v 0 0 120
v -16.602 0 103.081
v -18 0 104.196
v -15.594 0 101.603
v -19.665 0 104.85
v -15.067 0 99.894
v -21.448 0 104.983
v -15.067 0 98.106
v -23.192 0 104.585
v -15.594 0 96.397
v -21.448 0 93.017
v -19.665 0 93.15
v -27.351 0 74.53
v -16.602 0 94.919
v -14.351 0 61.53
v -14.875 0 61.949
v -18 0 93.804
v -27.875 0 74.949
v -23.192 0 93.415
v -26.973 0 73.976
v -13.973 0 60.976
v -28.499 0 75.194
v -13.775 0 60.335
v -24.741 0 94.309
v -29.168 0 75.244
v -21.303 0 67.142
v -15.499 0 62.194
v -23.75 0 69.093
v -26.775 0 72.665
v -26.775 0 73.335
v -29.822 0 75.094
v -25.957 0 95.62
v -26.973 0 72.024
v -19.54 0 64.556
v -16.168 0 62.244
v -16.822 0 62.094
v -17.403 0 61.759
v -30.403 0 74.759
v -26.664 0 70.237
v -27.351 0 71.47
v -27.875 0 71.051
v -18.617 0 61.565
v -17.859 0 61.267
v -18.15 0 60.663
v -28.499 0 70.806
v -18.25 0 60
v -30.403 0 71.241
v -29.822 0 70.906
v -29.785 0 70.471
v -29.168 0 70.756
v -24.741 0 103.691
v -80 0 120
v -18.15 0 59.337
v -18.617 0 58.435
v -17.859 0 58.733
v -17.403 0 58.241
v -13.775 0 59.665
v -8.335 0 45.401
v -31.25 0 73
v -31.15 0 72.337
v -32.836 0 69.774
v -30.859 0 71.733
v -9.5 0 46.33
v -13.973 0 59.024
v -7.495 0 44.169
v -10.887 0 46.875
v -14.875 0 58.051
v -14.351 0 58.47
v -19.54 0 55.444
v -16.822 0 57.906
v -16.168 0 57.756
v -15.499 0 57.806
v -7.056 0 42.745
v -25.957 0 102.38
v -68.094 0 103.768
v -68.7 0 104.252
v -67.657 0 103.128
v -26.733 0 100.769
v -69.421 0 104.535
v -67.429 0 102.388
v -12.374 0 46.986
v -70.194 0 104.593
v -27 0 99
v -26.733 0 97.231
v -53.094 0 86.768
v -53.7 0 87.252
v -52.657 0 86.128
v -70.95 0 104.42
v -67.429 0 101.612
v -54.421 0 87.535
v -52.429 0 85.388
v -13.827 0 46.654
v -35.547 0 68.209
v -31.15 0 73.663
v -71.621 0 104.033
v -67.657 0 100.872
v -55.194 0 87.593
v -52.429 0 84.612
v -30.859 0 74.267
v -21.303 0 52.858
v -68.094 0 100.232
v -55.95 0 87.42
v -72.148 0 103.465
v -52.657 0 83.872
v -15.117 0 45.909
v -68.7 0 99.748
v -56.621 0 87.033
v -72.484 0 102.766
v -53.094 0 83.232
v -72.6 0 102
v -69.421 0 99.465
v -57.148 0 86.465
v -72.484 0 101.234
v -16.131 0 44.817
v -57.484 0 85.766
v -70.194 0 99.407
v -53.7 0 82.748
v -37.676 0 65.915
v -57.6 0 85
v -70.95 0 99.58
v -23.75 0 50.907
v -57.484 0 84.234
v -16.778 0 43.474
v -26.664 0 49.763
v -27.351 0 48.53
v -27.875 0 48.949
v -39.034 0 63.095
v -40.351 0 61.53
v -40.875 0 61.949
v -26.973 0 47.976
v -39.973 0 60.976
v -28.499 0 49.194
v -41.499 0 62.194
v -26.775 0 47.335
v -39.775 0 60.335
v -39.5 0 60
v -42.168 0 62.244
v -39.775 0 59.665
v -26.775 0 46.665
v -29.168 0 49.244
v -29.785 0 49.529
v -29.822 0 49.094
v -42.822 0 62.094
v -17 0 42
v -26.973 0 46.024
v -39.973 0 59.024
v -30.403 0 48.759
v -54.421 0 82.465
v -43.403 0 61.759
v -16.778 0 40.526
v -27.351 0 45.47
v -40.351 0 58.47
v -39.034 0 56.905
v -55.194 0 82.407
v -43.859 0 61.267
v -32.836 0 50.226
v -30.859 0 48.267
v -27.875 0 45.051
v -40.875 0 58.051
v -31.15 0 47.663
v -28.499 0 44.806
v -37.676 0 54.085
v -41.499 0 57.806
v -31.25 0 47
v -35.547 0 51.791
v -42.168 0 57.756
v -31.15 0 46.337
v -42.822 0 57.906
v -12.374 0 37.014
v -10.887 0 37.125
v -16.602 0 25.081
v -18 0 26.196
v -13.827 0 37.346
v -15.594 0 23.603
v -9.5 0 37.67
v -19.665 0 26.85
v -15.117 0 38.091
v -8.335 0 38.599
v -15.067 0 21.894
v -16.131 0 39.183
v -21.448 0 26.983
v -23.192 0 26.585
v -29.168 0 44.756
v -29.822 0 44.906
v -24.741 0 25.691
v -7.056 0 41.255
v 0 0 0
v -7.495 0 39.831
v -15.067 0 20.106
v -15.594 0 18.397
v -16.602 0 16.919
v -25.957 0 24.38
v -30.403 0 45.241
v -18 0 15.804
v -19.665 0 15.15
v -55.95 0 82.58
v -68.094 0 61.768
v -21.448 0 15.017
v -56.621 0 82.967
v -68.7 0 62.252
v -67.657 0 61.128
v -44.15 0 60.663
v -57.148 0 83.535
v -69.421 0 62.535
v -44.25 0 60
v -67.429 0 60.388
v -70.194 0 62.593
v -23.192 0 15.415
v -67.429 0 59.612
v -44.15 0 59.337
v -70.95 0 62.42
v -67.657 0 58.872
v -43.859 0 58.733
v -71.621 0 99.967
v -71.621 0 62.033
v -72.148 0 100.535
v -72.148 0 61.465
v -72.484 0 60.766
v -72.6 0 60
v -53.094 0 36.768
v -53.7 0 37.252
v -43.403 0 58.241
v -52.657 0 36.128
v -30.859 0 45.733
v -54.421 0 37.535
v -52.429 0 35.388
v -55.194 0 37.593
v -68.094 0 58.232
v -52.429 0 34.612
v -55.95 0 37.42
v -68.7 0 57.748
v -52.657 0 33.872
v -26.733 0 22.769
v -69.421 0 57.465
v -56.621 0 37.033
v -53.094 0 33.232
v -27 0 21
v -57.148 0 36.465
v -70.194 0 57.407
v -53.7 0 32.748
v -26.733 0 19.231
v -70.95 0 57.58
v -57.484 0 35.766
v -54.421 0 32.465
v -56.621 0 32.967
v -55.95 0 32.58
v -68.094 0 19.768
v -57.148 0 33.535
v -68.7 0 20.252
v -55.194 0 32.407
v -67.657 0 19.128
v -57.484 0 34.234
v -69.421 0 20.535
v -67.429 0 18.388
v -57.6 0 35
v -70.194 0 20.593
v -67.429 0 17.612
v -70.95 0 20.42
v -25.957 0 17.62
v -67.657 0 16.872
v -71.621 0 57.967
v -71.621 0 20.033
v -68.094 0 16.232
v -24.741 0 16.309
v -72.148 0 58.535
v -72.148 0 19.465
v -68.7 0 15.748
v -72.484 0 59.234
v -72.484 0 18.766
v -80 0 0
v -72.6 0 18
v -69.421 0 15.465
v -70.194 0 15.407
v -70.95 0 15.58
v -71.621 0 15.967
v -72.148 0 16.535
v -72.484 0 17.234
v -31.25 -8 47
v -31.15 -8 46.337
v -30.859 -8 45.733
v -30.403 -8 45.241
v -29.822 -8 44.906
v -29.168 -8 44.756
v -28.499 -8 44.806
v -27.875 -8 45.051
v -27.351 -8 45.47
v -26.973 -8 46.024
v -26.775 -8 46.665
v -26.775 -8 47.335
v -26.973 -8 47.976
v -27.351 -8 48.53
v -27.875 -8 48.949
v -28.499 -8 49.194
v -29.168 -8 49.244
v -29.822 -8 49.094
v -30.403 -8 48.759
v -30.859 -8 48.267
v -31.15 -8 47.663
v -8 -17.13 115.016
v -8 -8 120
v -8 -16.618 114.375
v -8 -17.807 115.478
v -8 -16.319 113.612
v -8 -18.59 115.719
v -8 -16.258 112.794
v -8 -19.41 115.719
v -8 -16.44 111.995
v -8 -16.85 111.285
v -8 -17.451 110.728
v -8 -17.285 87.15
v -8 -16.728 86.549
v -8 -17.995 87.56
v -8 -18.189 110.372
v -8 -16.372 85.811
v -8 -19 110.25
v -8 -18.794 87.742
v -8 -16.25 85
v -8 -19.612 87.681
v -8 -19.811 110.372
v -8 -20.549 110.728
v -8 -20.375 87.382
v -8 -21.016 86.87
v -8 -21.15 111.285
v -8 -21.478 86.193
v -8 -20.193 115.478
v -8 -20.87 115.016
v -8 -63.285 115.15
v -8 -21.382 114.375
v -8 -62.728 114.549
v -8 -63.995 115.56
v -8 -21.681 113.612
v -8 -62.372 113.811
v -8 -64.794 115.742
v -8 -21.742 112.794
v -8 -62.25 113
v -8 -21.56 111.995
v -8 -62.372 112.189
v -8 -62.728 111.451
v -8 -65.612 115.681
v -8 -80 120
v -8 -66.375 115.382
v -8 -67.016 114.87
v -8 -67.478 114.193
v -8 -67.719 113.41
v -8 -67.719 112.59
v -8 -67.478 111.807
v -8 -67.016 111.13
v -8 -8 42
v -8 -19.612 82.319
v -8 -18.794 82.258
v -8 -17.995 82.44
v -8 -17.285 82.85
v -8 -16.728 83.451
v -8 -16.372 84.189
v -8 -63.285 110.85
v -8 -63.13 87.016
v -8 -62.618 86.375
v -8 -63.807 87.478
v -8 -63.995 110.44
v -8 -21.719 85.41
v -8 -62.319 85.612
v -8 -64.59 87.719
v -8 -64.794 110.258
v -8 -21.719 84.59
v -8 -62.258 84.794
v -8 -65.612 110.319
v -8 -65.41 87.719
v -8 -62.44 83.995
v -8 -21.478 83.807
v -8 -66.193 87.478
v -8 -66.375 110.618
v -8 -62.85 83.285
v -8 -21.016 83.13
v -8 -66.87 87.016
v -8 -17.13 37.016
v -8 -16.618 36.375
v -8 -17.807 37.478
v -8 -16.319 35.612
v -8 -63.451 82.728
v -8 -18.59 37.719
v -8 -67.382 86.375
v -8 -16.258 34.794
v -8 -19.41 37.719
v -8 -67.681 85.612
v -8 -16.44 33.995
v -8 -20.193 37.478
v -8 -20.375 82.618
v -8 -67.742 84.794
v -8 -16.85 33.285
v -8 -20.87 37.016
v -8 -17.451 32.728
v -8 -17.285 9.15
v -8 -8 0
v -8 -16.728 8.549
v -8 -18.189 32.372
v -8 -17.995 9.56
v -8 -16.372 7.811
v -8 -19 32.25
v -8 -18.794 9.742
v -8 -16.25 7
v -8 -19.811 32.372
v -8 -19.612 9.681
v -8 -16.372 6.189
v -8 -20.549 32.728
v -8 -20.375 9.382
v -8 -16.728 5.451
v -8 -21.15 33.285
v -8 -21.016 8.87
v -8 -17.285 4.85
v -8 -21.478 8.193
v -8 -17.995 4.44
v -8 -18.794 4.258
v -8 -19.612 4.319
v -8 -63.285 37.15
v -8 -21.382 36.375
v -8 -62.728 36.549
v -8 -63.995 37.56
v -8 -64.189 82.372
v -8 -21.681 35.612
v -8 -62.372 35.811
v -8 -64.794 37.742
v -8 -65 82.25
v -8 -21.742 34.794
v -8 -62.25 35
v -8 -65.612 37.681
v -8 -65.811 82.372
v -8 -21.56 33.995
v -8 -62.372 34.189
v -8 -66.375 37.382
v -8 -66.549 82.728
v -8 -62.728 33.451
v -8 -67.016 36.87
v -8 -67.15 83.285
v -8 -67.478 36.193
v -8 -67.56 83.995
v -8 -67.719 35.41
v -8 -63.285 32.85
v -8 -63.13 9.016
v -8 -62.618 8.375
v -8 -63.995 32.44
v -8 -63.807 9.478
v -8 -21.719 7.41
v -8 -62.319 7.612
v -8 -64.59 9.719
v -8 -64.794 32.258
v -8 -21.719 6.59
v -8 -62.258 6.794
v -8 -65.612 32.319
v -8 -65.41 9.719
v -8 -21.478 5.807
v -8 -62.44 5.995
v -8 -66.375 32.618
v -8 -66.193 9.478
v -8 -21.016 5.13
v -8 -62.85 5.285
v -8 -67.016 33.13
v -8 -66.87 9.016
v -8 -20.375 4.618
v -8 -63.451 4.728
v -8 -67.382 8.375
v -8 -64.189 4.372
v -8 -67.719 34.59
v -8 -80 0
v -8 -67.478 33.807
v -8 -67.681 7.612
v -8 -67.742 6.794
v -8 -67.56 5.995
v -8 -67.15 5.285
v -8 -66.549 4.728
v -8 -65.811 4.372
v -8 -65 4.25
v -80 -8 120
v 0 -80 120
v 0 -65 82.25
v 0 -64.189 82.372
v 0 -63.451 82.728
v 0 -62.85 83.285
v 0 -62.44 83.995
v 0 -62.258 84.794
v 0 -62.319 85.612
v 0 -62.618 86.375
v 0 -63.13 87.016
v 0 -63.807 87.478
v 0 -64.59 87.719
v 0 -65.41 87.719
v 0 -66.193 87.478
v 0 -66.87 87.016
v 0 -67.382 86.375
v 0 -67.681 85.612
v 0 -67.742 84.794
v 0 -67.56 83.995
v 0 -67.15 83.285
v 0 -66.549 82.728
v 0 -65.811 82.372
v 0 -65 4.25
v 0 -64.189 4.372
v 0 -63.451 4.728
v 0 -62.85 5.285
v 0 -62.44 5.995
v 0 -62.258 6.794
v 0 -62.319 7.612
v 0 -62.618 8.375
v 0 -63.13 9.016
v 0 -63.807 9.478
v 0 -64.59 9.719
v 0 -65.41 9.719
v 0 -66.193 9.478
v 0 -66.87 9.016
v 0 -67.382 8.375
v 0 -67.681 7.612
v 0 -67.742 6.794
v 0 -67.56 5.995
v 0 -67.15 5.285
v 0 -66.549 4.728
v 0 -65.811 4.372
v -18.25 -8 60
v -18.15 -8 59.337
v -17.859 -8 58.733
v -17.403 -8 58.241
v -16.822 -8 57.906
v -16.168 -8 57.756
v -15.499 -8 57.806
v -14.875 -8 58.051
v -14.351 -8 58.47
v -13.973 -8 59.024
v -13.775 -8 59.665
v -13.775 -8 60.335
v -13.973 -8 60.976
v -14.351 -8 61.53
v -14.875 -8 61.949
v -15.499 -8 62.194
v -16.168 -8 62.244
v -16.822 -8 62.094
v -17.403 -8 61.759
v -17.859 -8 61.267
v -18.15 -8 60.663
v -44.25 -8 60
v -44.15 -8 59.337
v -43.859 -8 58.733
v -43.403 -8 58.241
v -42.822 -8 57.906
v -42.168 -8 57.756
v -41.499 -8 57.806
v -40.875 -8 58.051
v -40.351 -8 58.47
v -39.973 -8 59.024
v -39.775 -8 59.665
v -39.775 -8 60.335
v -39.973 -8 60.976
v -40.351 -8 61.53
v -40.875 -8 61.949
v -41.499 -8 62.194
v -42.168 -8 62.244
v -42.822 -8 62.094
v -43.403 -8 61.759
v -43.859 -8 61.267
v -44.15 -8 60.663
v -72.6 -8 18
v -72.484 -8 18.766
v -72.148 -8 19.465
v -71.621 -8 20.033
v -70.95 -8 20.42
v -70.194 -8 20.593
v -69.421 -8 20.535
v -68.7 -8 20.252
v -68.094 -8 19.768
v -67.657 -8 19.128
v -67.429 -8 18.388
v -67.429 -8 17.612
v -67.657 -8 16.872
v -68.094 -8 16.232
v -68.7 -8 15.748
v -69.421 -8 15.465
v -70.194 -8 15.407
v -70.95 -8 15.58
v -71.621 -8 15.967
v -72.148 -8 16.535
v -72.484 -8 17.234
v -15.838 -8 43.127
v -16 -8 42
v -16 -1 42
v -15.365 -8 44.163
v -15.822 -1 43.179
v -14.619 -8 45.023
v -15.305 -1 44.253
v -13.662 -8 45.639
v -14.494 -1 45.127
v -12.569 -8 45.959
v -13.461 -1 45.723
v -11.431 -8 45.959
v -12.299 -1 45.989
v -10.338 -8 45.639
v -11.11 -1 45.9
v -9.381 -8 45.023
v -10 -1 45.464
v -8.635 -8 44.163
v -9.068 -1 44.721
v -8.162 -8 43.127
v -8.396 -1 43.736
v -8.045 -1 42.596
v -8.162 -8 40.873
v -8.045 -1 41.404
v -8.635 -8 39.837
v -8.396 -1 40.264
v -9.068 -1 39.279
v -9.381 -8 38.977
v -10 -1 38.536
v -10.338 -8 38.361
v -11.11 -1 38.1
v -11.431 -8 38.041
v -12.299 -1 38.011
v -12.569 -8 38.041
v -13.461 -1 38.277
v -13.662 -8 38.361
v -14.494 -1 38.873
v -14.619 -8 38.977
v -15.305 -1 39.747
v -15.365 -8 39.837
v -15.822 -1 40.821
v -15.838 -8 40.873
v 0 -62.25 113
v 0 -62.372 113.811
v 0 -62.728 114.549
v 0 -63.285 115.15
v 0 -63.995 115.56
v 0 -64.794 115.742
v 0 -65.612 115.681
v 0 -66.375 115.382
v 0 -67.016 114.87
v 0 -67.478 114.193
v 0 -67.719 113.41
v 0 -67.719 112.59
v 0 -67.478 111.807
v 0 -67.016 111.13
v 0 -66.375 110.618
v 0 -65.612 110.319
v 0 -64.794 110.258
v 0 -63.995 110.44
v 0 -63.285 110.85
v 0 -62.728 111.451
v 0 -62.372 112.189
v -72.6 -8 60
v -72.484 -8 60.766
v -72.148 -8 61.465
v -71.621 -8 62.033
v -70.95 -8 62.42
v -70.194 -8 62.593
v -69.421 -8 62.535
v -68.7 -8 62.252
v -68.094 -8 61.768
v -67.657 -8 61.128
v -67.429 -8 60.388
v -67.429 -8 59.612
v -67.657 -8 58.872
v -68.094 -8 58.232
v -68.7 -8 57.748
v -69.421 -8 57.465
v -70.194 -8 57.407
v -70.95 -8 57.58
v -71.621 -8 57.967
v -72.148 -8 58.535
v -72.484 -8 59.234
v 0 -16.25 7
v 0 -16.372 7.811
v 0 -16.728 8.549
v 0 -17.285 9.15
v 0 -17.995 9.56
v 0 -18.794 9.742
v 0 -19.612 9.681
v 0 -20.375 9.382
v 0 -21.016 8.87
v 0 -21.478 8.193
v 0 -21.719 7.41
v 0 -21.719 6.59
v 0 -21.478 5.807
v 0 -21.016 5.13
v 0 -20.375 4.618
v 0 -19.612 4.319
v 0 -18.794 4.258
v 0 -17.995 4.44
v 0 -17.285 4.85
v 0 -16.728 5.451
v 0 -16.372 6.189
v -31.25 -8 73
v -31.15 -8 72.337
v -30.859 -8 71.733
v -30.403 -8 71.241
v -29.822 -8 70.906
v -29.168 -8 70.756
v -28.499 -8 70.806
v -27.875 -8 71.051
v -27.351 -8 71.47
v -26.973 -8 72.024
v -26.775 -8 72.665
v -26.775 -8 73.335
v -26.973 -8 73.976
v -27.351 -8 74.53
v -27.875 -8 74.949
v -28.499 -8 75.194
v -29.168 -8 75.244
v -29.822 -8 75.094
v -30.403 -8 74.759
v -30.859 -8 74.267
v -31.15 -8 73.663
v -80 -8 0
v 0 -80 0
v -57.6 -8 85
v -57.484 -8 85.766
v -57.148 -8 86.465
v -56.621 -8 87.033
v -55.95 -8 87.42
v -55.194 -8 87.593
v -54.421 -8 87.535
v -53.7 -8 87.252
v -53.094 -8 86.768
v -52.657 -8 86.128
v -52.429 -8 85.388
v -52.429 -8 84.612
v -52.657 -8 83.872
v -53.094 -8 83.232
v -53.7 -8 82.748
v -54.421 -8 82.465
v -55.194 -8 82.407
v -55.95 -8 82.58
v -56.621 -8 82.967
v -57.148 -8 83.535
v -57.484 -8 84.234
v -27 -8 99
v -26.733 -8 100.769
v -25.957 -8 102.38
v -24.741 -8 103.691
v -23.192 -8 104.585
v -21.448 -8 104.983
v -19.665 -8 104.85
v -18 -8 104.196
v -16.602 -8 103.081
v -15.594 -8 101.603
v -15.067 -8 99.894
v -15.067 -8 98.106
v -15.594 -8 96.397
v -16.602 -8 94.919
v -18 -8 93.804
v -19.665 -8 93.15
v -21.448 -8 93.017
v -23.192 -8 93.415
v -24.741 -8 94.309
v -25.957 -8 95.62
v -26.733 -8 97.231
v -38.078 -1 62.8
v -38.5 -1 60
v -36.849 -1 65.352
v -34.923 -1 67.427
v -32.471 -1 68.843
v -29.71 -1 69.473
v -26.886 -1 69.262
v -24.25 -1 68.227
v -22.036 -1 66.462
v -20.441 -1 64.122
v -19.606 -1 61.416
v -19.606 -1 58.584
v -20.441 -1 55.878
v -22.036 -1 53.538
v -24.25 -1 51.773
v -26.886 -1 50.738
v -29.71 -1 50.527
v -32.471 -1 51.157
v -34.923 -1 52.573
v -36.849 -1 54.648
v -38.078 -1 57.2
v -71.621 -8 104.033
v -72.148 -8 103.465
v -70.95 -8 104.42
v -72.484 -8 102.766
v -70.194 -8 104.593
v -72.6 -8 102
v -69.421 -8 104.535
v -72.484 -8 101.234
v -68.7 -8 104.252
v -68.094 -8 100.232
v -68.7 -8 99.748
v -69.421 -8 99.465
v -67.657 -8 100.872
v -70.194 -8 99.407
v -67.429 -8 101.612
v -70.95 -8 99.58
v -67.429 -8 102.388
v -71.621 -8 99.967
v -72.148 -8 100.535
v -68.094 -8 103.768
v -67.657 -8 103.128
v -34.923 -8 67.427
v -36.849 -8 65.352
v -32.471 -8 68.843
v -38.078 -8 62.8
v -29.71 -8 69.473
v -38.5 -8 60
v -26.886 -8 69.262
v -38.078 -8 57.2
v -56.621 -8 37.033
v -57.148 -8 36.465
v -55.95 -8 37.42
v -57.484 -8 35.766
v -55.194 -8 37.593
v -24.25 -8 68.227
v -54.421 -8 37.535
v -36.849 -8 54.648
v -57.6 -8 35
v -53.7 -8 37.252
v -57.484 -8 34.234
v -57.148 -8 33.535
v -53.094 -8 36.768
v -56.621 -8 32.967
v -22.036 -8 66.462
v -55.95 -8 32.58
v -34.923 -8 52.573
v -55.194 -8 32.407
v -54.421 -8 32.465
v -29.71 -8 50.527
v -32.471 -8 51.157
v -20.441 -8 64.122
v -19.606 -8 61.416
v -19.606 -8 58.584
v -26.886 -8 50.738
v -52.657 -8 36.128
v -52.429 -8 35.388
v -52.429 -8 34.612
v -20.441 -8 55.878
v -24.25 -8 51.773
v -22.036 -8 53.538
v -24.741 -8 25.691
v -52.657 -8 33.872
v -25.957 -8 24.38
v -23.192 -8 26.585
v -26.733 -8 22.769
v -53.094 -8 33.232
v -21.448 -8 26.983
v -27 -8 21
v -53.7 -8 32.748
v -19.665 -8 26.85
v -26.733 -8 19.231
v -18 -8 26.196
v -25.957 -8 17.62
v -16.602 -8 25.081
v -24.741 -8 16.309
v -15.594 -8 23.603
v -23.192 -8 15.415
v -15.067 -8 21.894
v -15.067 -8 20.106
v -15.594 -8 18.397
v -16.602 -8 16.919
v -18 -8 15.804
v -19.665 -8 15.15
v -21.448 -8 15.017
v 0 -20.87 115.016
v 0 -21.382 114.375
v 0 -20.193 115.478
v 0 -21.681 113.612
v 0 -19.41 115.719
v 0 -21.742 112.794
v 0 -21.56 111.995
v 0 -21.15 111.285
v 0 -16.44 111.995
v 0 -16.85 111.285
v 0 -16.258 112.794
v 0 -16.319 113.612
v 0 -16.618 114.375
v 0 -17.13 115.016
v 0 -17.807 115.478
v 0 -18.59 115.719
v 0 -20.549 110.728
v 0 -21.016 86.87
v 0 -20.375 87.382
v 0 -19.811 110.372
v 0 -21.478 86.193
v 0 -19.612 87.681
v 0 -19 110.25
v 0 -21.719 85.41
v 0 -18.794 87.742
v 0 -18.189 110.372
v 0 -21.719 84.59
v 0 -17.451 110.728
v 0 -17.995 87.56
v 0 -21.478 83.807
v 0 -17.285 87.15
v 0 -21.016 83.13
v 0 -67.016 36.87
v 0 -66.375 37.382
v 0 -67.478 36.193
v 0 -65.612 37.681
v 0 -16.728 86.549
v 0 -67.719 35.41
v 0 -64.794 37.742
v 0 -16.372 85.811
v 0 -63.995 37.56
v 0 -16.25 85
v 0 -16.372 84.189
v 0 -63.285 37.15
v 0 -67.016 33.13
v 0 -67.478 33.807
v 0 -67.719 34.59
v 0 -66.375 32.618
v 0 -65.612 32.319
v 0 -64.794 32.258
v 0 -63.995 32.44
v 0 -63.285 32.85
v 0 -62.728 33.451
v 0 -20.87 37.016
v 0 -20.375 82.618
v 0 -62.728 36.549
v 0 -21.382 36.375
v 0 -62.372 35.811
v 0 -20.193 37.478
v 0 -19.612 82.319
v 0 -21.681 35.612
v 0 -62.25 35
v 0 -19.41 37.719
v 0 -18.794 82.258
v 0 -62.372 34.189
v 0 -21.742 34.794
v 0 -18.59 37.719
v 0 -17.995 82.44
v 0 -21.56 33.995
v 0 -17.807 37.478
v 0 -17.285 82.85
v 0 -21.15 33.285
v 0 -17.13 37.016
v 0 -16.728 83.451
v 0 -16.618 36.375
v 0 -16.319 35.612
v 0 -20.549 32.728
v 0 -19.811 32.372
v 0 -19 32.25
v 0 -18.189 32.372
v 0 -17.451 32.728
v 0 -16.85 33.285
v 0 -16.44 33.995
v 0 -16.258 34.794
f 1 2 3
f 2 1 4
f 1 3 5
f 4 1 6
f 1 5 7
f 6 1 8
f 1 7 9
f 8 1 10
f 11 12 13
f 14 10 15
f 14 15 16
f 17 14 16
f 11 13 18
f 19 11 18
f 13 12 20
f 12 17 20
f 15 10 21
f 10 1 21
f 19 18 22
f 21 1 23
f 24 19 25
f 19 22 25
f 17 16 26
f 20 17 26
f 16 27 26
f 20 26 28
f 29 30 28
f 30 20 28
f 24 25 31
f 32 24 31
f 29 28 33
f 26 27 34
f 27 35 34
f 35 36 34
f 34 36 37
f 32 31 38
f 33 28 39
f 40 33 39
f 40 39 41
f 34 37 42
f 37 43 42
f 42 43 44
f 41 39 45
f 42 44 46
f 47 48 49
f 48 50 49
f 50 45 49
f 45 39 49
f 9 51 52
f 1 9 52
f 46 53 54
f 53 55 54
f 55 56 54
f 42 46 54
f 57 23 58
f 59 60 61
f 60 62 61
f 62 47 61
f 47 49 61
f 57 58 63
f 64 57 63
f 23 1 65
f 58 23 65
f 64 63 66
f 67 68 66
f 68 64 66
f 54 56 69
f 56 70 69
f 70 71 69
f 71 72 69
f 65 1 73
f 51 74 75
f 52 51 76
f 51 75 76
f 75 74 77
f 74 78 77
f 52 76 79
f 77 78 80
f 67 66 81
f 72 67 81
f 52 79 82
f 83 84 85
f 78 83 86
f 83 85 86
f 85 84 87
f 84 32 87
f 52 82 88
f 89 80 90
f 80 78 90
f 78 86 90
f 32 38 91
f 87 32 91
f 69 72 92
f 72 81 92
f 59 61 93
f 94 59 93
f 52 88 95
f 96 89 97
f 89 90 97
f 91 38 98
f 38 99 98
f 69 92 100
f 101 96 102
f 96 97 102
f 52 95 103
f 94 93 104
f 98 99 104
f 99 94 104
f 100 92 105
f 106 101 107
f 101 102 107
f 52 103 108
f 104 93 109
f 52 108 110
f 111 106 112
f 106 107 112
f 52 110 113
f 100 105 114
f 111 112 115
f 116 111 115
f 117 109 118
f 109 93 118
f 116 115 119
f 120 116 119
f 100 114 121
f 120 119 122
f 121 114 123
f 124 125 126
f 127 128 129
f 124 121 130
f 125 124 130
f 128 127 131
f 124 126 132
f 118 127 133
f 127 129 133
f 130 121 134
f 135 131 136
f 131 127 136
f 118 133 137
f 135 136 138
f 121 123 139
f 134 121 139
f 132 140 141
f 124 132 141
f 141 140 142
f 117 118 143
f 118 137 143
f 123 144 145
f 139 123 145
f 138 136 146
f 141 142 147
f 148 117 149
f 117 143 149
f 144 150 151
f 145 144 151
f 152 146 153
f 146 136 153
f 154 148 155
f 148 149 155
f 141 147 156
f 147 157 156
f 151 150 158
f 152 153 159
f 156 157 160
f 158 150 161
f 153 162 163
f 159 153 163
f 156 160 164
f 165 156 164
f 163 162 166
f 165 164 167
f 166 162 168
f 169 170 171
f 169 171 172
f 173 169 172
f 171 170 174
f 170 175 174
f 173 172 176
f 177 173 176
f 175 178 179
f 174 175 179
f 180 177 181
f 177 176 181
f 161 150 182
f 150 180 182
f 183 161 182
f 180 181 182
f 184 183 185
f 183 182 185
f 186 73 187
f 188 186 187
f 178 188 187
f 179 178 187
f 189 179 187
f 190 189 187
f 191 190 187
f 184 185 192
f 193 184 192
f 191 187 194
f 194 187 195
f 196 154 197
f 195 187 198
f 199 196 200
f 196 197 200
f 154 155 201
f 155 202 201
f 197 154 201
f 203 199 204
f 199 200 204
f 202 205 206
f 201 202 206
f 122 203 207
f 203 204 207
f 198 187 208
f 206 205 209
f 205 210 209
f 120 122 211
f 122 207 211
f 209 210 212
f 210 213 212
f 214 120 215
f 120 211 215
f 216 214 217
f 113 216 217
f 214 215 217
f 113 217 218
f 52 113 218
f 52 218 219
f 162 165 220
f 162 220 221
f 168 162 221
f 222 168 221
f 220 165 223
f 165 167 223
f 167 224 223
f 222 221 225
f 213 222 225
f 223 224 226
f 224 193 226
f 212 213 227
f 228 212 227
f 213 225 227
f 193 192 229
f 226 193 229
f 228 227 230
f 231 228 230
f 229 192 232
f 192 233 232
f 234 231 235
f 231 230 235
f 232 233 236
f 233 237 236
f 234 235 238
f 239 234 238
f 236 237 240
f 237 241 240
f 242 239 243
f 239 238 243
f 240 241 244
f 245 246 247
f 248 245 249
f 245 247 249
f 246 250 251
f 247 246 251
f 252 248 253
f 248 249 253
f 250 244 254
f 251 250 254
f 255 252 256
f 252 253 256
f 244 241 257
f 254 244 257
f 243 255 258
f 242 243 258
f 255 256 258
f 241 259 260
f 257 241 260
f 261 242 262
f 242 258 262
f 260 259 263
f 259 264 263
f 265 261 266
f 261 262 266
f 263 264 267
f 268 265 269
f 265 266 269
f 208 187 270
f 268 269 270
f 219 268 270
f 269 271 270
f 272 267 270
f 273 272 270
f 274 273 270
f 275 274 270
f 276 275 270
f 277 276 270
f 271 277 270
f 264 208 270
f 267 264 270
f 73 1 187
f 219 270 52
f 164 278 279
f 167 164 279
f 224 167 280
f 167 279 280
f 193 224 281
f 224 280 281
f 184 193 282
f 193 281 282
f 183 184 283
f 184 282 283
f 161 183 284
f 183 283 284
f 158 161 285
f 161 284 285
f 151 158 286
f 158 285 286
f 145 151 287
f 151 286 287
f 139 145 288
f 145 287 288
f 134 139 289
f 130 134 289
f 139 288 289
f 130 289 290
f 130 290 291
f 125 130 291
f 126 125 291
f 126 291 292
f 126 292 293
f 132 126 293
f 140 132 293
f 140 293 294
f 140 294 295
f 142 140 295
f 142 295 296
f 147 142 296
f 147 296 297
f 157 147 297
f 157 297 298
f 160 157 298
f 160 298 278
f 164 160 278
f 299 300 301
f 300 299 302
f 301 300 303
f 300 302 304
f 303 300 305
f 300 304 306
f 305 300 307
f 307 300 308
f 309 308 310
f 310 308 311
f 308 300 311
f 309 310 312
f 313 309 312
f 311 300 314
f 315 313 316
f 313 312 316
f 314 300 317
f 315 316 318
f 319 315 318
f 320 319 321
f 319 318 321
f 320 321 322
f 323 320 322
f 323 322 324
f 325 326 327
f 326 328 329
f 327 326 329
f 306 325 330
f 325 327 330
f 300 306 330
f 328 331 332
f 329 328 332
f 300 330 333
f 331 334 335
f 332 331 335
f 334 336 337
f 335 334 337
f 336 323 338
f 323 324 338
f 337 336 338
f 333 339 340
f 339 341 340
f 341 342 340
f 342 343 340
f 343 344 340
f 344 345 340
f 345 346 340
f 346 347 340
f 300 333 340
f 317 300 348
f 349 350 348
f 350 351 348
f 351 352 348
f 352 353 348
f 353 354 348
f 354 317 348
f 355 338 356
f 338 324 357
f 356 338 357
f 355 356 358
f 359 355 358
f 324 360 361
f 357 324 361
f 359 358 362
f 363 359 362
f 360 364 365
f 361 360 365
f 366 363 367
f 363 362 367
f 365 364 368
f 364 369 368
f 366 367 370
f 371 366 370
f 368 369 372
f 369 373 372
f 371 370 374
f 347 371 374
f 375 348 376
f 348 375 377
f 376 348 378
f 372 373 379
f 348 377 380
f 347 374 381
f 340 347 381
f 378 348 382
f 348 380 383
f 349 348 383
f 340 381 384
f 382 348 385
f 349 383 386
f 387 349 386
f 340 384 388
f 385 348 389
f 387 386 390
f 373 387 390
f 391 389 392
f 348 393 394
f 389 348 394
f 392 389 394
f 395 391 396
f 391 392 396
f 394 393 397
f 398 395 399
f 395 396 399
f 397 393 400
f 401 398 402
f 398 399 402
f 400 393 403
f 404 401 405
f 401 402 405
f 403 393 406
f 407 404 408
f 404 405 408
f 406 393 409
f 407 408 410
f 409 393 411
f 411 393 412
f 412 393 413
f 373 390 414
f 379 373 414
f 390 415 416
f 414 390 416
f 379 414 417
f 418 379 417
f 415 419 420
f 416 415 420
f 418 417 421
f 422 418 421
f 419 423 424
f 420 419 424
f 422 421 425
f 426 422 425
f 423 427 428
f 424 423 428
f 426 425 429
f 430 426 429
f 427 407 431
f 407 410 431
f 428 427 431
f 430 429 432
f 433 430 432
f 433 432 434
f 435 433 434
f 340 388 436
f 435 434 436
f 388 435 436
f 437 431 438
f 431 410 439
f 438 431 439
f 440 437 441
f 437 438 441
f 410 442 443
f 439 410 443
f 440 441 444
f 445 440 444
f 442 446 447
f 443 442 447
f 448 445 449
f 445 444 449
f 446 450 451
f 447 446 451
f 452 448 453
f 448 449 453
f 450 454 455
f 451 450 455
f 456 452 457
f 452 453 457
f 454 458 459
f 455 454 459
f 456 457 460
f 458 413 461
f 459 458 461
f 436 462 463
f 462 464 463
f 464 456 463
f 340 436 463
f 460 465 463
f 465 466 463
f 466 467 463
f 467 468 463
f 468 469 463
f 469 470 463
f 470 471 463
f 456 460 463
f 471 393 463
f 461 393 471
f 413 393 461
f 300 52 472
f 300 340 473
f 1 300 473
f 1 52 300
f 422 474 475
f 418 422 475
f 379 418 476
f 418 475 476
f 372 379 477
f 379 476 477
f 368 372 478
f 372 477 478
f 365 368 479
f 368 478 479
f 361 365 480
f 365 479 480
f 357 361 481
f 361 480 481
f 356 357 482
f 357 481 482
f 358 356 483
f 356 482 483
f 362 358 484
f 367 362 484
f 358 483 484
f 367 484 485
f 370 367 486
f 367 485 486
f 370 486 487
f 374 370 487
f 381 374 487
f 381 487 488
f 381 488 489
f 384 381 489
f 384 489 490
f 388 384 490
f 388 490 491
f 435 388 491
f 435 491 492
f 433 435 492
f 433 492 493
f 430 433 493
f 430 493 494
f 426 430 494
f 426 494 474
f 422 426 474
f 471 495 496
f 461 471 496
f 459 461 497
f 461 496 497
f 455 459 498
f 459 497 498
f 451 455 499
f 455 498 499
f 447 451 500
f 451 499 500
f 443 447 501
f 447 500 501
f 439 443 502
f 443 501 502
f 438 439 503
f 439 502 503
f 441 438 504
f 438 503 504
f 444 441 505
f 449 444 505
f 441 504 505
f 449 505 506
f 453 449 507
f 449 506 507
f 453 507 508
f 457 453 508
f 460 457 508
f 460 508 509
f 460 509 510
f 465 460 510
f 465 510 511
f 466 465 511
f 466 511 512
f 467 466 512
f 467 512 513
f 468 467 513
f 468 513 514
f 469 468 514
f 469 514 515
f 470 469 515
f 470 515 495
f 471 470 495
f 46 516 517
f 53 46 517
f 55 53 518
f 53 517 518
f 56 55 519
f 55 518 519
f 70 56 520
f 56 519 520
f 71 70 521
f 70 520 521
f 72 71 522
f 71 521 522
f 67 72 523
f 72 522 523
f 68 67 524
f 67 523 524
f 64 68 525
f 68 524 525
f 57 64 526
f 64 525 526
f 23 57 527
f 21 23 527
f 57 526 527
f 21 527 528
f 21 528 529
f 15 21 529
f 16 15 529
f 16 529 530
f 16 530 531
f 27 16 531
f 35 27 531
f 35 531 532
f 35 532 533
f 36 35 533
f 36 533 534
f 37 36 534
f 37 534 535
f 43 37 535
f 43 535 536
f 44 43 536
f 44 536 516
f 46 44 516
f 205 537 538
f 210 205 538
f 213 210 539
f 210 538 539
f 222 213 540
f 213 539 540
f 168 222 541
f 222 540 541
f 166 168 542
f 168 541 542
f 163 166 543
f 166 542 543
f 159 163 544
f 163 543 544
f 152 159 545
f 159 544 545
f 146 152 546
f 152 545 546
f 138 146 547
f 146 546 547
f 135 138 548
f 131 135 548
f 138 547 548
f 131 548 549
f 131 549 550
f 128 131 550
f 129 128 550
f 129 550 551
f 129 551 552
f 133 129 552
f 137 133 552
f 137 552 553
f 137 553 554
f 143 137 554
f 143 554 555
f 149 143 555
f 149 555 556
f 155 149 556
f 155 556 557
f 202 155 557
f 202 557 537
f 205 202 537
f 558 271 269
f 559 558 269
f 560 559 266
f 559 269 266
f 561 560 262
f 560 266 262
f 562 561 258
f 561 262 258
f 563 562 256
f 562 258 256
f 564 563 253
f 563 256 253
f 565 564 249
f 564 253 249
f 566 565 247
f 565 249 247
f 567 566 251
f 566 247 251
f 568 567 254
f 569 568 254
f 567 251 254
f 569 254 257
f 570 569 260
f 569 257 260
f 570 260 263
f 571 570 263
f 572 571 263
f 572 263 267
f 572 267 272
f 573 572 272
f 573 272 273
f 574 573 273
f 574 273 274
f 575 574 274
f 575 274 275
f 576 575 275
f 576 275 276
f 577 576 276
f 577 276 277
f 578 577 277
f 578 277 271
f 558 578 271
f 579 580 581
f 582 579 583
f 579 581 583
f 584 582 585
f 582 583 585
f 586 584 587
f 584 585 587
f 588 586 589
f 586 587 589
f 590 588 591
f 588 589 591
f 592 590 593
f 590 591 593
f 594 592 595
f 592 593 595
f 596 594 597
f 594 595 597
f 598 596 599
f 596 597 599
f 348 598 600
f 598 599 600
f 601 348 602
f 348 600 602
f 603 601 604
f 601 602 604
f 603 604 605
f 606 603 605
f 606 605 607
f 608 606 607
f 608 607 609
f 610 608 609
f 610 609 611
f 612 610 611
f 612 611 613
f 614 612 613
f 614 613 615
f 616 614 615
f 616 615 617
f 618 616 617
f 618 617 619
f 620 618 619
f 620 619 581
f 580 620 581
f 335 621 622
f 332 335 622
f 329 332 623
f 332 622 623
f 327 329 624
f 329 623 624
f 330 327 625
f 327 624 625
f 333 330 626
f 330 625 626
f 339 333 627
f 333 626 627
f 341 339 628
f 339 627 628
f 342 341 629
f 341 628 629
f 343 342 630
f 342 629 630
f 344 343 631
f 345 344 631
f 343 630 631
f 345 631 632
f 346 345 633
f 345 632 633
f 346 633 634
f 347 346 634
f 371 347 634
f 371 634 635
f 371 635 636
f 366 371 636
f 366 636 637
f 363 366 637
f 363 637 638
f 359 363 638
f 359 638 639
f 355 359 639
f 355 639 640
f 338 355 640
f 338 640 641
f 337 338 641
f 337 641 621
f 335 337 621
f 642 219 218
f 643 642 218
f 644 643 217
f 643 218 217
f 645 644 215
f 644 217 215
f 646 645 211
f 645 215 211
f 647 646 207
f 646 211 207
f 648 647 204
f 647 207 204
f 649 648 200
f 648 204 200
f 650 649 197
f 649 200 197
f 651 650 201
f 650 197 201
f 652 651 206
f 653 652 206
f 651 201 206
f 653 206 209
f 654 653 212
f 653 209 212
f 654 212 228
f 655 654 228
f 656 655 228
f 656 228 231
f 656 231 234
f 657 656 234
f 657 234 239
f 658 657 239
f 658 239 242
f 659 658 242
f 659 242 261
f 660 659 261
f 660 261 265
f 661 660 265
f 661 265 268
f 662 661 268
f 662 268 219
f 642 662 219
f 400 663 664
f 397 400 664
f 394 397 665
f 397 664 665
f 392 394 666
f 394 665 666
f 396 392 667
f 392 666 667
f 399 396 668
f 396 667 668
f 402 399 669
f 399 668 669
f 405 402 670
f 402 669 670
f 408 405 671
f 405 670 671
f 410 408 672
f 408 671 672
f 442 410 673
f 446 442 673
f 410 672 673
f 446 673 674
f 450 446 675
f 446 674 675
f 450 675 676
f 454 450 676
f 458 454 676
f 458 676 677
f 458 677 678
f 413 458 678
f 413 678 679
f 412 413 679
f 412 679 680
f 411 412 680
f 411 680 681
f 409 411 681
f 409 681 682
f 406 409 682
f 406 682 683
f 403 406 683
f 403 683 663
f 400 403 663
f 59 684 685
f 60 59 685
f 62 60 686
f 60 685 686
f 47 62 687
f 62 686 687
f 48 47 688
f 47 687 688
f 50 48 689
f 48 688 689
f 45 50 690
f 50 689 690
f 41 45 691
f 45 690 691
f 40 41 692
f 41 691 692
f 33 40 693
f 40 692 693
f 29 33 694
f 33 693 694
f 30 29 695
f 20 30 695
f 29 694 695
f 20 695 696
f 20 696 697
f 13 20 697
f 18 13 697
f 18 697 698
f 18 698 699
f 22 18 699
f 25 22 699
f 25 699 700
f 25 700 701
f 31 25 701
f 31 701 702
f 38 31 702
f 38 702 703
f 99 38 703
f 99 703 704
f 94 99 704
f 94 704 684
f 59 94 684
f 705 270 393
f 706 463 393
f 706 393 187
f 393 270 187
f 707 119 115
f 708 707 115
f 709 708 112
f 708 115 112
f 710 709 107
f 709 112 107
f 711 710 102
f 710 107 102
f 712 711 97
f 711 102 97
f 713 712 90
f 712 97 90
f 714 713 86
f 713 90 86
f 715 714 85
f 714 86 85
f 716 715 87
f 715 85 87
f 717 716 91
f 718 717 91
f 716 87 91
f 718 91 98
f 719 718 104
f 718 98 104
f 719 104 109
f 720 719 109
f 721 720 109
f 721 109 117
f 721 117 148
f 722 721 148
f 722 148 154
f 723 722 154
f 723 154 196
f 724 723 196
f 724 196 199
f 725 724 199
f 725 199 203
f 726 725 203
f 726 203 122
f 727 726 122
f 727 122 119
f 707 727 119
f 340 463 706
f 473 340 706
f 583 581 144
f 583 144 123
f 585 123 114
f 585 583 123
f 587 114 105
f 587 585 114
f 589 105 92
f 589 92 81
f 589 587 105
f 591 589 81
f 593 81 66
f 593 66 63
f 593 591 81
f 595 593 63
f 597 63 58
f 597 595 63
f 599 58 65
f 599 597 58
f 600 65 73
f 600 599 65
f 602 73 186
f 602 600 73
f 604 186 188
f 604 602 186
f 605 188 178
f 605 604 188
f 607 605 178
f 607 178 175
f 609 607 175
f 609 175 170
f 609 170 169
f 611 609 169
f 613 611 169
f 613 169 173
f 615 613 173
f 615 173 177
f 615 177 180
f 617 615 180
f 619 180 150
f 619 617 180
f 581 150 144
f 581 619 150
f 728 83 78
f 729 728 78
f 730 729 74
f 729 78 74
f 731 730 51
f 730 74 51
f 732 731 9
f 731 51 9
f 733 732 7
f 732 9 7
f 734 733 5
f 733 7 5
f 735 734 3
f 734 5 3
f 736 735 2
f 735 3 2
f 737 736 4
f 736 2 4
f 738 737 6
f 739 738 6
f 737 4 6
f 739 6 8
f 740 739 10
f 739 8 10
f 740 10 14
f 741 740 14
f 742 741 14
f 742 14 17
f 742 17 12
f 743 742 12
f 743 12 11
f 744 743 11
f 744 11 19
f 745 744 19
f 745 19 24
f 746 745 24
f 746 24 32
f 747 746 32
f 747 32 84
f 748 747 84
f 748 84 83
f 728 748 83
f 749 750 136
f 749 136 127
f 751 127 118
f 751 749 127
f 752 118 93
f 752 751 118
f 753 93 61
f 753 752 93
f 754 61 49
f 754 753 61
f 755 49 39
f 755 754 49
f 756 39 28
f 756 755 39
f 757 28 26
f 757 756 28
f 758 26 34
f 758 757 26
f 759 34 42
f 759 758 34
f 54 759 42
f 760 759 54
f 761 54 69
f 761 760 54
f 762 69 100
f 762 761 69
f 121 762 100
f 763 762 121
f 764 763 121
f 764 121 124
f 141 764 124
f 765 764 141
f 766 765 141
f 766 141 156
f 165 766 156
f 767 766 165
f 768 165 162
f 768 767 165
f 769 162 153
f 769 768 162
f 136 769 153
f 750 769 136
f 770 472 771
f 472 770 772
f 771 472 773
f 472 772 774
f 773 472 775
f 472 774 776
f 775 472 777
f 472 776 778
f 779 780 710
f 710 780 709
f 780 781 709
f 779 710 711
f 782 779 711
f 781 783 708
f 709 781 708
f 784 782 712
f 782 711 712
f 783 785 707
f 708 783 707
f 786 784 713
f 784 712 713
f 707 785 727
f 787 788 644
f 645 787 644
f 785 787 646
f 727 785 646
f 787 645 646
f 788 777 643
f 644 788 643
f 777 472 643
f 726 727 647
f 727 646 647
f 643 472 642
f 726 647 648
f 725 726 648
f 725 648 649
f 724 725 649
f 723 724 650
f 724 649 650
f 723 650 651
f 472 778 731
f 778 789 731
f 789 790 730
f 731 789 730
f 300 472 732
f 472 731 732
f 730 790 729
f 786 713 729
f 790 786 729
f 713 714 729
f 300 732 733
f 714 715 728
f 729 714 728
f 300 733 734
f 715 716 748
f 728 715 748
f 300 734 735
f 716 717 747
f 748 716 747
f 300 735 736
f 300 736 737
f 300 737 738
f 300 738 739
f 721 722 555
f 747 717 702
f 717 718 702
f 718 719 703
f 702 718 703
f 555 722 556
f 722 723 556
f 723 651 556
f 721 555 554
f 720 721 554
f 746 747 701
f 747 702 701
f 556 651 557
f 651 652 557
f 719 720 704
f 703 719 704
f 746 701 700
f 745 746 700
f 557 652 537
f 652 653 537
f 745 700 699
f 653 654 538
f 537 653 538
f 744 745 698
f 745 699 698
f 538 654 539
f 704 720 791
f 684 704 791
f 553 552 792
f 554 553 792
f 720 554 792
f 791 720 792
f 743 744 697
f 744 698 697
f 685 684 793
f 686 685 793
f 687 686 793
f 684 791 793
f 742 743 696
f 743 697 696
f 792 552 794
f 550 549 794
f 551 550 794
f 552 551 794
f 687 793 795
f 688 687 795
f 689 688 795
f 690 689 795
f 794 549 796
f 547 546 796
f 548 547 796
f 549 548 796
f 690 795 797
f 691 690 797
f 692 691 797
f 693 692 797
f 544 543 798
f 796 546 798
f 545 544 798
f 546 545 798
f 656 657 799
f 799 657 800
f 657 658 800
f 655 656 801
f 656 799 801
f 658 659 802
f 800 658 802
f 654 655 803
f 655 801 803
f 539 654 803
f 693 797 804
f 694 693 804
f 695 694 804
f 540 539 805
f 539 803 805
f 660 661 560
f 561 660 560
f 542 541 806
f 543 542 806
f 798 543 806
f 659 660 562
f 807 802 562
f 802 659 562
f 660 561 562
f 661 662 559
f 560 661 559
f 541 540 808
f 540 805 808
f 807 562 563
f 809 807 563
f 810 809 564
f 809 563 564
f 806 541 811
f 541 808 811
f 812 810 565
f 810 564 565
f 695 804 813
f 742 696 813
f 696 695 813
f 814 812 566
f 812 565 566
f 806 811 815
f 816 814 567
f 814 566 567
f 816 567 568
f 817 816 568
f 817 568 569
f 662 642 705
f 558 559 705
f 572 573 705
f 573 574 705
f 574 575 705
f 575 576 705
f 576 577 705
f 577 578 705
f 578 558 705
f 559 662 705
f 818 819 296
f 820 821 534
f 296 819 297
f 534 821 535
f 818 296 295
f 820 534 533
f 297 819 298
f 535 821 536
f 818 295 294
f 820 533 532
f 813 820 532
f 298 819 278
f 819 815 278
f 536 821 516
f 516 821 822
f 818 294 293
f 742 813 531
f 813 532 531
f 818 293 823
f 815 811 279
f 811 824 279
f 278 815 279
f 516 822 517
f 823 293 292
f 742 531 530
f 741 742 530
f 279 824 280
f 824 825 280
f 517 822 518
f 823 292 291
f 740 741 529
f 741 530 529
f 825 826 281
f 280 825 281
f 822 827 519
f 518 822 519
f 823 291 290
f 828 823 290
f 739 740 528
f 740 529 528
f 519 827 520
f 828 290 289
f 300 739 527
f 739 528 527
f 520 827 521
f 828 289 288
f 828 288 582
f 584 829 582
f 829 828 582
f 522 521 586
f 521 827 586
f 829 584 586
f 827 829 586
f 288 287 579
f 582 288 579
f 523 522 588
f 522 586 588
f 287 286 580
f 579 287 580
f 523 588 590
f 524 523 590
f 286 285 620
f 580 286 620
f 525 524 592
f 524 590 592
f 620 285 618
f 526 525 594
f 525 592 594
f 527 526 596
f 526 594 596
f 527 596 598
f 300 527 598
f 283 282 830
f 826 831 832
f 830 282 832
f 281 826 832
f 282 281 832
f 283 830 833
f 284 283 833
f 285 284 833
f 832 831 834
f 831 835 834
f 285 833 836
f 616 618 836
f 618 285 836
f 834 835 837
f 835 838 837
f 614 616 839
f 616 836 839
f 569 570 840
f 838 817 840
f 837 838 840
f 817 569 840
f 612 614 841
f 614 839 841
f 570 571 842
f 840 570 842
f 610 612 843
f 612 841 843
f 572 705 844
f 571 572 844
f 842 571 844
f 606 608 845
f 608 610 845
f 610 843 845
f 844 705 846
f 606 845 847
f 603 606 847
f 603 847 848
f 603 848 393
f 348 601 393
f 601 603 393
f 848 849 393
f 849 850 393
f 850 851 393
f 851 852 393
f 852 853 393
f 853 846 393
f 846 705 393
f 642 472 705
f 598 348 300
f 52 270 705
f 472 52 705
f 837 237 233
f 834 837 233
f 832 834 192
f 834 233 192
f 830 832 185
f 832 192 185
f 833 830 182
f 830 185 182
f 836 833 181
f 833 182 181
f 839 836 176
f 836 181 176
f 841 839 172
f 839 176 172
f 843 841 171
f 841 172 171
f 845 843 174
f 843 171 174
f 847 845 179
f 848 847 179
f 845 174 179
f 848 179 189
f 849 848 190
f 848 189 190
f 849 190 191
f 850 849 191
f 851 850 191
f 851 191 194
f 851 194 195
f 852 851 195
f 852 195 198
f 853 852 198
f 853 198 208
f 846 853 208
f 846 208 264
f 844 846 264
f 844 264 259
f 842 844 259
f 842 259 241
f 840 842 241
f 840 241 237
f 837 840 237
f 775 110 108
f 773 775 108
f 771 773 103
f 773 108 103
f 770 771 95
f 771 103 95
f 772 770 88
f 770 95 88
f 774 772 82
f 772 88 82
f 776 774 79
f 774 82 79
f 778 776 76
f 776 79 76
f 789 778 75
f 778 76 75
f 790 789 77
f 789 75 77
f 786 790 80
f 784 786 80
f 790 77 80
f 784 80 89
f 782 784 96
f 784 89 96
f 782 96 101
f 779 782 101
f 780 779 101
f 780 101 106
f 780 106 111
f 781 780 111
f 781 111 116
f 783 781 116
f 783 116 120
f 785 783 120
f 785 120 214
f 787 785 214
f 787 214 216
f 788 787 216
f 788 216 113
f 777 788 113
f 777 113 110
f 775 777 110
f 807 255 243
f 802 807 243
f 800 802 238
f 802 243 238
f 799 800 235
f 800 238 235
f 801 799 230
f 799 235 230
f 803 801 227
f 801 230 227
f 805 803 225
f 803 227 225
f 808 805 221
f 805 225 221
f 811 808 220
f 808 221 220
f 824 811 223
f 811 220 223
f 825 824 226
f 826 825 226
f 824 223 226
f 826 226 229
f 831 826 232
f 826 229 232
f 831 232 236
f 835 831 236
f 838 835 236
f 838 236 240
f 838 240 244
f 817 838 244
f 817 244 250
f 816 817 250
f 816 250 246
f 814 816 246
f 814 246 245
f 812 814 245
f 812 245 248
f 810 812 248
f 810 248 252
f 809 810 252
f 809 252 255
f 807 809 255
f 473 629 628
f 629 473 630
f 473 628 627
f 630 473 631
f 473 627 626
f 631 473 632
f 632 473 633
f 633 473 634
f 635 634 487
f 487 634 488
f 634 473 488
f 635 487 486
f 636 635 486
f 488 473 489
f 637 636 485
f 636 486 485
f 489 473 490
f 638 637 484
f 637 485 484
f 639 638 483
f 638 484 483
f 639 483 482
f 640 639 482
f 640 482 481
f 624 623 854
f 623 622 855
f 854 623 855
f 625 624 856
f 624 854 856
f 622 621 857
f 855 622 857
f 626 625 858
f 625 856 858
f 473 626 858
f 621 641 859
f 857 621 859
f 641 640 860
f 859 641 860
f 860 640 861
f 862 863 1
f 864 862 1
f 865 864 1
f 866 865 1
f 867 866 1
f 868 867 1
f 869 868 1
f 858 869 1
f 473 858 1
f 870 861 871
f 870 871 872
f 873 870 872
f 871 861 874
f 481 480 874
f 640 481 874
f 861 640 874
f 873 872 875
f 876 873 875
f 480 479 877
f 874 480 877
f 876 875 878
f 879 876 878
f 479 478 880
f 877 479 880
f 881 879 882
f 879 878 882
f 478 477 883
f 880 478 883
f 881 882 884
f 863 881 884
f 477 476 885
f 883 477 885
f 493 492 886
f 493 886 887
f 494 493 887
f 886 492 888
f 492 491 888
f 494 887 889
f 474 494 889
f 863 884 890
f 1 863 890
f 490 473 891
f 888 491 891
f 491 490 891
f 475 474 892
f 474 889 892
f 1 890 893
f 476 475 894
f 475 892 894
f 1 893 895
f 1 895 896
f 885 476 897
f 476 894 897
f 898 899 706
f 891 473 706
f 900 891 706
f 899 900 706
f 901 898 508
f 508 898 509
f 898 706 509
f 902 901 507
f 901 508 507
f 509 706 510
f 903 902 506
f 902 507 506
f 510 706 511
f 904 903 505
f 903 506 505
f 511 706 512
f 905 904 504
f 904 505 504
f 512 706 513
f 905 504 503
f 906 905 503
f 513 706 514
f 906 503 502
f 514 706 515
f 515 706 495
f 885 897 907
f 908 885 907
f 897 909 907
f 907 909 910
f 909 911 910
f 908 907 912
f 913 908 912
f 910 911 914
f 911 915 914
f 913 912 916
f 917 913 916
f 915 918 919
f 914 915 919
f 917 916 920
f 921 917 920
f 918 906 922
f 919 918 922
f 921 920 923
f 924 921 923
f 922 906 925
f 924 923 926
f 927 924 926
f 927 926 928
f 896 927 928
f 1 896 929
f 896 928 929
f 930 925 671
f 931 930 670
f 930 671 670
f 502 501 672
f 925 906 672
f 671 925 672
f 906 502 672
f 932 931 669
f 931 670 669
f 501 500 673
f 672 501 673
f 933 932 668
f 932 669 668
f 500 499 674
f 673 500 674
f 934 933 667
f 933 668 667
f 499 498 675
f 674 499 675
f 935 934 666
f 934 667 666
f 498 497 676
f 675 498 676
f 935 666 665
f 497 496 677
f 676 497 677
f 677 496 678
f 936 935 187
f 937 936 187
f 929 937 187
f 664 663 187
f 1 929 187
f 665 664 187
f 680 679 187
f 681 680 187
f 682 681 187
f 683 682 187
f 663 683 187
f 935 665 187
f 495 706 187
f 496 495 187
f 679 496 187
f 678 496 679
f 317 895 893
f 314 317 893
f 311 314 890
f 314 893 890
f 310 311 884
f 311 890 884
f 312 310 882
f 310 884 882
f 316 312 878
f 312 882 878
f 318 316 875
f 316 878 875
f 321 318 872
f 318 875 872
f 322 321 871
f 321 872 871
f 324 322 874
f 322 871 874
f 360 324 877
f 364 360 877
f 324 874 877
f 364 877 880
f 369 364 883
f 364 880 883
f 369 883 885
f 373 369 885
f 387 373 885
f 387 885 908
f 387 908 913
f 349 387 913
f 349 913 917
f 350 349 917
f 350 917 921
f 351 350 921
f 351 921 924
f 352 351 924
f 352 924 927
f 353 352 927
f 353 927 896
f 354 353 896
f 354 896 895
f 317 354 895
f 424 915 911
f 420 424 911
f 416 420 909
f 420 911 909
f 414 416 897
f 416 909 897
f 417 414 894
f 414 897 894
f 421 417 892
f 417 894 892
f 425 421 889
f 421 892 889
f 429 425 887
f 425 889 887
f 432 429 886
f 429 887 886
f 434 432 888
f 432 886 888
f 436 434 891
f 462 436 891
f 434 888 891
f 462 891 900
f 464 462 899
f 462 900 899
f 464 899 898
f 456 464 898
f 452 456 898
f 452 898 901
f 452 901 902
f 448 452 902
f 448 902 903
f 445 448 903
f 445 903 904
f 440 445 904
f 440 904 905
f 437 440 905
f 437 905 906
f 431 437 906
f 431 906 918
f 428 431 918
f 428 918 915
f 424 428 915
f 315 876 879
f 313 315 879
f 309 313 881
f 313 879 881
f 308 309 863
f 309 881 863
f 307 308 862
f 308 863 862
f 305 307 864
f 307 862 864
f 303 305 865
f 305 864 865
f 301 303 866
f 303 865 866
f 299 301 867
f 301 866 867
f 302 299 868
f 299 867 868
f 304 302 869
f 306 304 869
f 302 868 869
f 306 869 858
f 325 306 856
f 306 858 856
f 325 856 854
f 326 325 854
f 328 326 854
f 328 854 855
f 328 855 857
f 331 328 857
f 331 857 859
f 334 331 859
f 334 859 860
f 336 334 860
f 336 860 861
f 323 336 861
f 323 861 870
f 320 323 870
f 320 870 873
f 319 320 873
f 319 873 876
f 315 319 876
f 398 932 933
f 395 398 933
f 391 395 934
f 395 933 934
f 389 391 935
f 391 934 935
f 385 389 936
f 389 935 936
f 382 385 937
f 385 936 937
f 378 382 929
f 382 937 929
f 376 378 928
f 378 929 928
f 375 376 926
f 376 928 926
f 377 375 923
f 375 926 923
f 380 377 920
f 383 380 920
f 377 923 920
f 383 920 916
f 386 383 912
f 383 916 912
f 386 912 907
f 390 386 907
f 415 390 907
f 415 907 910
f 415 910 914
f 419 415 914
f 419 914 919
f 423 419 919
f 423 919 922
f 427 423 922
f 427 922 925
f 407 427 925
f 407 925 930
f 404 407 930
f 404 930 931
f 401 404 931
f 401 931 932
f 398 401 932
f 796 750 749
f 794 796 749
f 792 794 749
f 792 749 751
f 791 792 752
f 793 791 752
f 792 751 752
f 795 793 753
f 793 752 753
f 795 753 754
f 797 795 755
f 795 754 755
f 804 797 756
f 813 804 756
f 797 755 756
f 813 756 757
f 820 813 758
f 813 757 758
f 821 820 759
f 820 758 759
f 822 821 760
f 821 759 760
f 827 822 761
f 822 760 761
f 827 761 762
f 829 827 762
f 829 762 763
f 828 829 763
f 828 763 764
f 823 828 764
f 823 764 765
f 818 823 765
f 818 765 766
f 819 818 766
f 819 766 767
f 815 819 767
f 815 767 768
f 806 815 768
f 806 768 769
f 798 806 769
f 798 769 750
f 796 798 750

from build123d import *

# Parameters (mm, degrees)
ESTRUSIONE_ESTRUSIONE1_DEPTH = 120
TAGLIO_ESTRUSIONE2_REACH     = 166.924
SCHIZZO6_R                   = 6
TAGLIO_ESTRUSIONE3_REACH     = 166.924
SCHIZZO7_R                   = 9.5
SCHIZZO7_R_2                 = 4
FORO_PER_VITE_M4_2_D         = 4.5
SCHIZZO12_R                  = 2.75
TAGLIO_ESTRUSIONE4_DEPTH     = 10
SCHIZZO14_R                  = 2.6
TAGLIO_ESTRUSIONE5_DEPTH     = 10
SMUSSO1_SIZE                 = 1
SMUSSO2_SIZE                 = 1


with BuildPart() as part:
    # Schizzo1 → Estrusione-Estrusione1 (new body)
    with BuildSketch(Plane.XY):
        Polygon((0, 0), (-80, 0), (-80, -8), (-8, -8), (-8, -80), (0, -80), align=None)
    extrude(amount=ESTRUSIONE_ESTRUSIONE1_DEPTH)

    # Schizzo6 → Taglio-Estrusione2 (cut, up to next)
    with BuildSketch(Plane(origin=(0, 0, 0), x_dir=(1, 0, 0), z_dir=(0, 1, 0)), mode=Mode.PRIVATE) as taglio_estrusione2_sk1:
        with Locations(Location((-21, -21, 0), (0, 0, 180))):
            Circle(SCHIZZO6_R)
    taglio_estrusione2_tool1 = extrude(taglio_estrusione2_sk1.sketch, amount=-TAGLIO_ESTRUSIONE2_REACH, mode=Mode.PRIVATE) & part.part
    # Schizzo6 → Taglio-Estrusione2 (cut, up to next)
    with BuildSketch(Plane(origin=(0, 0, 0), x_dir=(1, 0, 0), z_dir=(0, 1, 0)), mode=Mode.PRIVATE) as taglio_estrusione2_sk2:
        with Locations(Location((-21, -99, 0), (0, 0, 180))):
            Circle(SCHIZZO6_R)
    taglio_estrusione2_tool2 = extrude(taglio_estrusione2_sk2.sketch, amount=-TAGLIO_ESTRUSIONE2_REACH, mode=Mode.PRIVATE) & part.part
    add(taglio_estrusione2_tool1.solids().sort_by_distance((-21, 0, 21))[0], mode=Mode.SUBTRACT)
    add(taglio_estrusione2_tool2.solids().sort_by_distance((-21, 0, 99))[0], mode=Mode.SUBTRACT)

    # Schizzo7 → Taglio-Estrusione3 (cut, up to next)
    with BuildSketch(Plane(origin=(0, 0, 0), x_dir=(1, 0, 0), z_dir=(0, 1, 0)), mode=Mode.PRIVATE) as taglio_estrusione3_sk1:
        with Locations(Location((-29, -60, 0), (0, 0, 180))):
            Circle(SCHIZZO7_R)
    taglio_estrusione3_tool1 = extrude(taglio_estrusione3_sk1.sketch, amount=-TAGLIO_ESTRUSIONE3_REACH, mode=Mode.PRIVATE) & part.part
    # Schizzo7 → Taglio-Estrusione3 (cut, up to next)
    with BuildSketch(Plane(origin=(0, 0, 0), x_dir=(1, 0, 0), z_dir=(0, 1, 0)), mode=Mode.PRIVATE) as taglio_estrusione3_sk2:
        with Locations(Location((-12, -42, 0), (0, 0, 180))):
            Circle(SCHIZZO7_R_2)
    taglio_estrusione3_tool2 = extrude(taglio_estrusione3_sk2.sketch, amount=-TAGLIO_ESTRUSIONE3_REACH, mode=Mode.PRIVATE) & part.part
    add(taglio_estrusione3_tool1.solids().sort_by_distance((-29, 0, 60))[0], mode=Mode.SUBTRACT)
    add(taglio_estrusione3_tool2.solids().sort_by_distance((-12, 0, 42))[0], mode=Mode.SUBTRACT)

    # Foro per Vite M4-2 (through all)
    with Locations(Plane(origin=(0, 0, 0), x_dir=(1, 0, 0), z_dir=(0, 1, 0))):
        with Locations((-29, -47), (-42, -60), (-29, -73), (-16, -60), (-29, -60)):
            Hole(FORO_PER_VITE_M4_2_D / 2)

    # Schizzo12 → Taglio-Estrusione4 (cut)
    with BuildSketch(Plane(origin=(0, 0, 0), x_dir=(0, 0, -1), z_dir=(1, 0, 0))):
        with Locations((-113, -19)):
            Circle(SCHIZZO12_R)
        with Locations(Location((-85, -19, 0), (0, 0, 90))):
            Circle(SCHIZZO12_R)
        with Locations((-35, -19)):
            Circle(SCHIZZO12_R)
        with Locations(Location((-7, -19, 0), (0, 0, 90))):
            Circle(SCHIZZO12_R)
        with Locations((-85, -65)):
            Circle(SCHIZZO12_R)
        with Locations(Location((-113, -65, 0), (0, 0, 90))):
            Circle(SCHIZZO12_R)
        with Locations((-7, -65)):
            Circle(SCHIZZO12_R)
        with Locations(Location((-35, -65, 0), (0, 0, 90))):
            Circle(SCHIZZO12_R)
    extrude(amount=-TAGLIO_ESTRUSIONE4_DEPTH, mode=Mode.SUBTRACT)

    # Schizzo14 → Taglio-Estrusione5 (cut)
    with BuildSketch(Plane(origin=(0, 0, 0), x_dir=(1, 0, 0), z_dir=(0, 1, 0))):
        with Locations(Location((-70, -18, 0), (0, 0, 180))):
            Circle(SCHIZZO14_R)
        with Locations(Location((-70, -60, 0), (0, 0, 180))):
            Circle(SCHIZZO14_R)
        with Locations(Location((-70, -102, 0), (0, 0, 180))):
            Circle(SCHIZZO14_R)
        with Locations(Location((-55, -35, 0), (0, 0, 180))):
            Circle(SCHIZZO14_R)
        with Locations(Location((-55, -85, 0), (0, 0, 180))):
            Circle(SCHIZZO14_R)
    extrude(amount=-TAGLIO_ESTRUSIONE5_DEPTH, mode=Mode.SUBTRACT)

    # Smusso1
    smusso1_edges = [part.edges().sort_by_distance(p)[0] for p in [
        (-8, 0, 42),
    ]]
    chamfer(smusso1_edges, length=SMUSSO1_SIZE)

    # Smusso2
    smusso2_edges = [part.edges().sort_by_distance(p)[0] for p in [
        (-19.5, 0, 60),
    ]]
    chamfer(smusso2_edges, length=SMUSSO2_SIZE)


solid = part.part
